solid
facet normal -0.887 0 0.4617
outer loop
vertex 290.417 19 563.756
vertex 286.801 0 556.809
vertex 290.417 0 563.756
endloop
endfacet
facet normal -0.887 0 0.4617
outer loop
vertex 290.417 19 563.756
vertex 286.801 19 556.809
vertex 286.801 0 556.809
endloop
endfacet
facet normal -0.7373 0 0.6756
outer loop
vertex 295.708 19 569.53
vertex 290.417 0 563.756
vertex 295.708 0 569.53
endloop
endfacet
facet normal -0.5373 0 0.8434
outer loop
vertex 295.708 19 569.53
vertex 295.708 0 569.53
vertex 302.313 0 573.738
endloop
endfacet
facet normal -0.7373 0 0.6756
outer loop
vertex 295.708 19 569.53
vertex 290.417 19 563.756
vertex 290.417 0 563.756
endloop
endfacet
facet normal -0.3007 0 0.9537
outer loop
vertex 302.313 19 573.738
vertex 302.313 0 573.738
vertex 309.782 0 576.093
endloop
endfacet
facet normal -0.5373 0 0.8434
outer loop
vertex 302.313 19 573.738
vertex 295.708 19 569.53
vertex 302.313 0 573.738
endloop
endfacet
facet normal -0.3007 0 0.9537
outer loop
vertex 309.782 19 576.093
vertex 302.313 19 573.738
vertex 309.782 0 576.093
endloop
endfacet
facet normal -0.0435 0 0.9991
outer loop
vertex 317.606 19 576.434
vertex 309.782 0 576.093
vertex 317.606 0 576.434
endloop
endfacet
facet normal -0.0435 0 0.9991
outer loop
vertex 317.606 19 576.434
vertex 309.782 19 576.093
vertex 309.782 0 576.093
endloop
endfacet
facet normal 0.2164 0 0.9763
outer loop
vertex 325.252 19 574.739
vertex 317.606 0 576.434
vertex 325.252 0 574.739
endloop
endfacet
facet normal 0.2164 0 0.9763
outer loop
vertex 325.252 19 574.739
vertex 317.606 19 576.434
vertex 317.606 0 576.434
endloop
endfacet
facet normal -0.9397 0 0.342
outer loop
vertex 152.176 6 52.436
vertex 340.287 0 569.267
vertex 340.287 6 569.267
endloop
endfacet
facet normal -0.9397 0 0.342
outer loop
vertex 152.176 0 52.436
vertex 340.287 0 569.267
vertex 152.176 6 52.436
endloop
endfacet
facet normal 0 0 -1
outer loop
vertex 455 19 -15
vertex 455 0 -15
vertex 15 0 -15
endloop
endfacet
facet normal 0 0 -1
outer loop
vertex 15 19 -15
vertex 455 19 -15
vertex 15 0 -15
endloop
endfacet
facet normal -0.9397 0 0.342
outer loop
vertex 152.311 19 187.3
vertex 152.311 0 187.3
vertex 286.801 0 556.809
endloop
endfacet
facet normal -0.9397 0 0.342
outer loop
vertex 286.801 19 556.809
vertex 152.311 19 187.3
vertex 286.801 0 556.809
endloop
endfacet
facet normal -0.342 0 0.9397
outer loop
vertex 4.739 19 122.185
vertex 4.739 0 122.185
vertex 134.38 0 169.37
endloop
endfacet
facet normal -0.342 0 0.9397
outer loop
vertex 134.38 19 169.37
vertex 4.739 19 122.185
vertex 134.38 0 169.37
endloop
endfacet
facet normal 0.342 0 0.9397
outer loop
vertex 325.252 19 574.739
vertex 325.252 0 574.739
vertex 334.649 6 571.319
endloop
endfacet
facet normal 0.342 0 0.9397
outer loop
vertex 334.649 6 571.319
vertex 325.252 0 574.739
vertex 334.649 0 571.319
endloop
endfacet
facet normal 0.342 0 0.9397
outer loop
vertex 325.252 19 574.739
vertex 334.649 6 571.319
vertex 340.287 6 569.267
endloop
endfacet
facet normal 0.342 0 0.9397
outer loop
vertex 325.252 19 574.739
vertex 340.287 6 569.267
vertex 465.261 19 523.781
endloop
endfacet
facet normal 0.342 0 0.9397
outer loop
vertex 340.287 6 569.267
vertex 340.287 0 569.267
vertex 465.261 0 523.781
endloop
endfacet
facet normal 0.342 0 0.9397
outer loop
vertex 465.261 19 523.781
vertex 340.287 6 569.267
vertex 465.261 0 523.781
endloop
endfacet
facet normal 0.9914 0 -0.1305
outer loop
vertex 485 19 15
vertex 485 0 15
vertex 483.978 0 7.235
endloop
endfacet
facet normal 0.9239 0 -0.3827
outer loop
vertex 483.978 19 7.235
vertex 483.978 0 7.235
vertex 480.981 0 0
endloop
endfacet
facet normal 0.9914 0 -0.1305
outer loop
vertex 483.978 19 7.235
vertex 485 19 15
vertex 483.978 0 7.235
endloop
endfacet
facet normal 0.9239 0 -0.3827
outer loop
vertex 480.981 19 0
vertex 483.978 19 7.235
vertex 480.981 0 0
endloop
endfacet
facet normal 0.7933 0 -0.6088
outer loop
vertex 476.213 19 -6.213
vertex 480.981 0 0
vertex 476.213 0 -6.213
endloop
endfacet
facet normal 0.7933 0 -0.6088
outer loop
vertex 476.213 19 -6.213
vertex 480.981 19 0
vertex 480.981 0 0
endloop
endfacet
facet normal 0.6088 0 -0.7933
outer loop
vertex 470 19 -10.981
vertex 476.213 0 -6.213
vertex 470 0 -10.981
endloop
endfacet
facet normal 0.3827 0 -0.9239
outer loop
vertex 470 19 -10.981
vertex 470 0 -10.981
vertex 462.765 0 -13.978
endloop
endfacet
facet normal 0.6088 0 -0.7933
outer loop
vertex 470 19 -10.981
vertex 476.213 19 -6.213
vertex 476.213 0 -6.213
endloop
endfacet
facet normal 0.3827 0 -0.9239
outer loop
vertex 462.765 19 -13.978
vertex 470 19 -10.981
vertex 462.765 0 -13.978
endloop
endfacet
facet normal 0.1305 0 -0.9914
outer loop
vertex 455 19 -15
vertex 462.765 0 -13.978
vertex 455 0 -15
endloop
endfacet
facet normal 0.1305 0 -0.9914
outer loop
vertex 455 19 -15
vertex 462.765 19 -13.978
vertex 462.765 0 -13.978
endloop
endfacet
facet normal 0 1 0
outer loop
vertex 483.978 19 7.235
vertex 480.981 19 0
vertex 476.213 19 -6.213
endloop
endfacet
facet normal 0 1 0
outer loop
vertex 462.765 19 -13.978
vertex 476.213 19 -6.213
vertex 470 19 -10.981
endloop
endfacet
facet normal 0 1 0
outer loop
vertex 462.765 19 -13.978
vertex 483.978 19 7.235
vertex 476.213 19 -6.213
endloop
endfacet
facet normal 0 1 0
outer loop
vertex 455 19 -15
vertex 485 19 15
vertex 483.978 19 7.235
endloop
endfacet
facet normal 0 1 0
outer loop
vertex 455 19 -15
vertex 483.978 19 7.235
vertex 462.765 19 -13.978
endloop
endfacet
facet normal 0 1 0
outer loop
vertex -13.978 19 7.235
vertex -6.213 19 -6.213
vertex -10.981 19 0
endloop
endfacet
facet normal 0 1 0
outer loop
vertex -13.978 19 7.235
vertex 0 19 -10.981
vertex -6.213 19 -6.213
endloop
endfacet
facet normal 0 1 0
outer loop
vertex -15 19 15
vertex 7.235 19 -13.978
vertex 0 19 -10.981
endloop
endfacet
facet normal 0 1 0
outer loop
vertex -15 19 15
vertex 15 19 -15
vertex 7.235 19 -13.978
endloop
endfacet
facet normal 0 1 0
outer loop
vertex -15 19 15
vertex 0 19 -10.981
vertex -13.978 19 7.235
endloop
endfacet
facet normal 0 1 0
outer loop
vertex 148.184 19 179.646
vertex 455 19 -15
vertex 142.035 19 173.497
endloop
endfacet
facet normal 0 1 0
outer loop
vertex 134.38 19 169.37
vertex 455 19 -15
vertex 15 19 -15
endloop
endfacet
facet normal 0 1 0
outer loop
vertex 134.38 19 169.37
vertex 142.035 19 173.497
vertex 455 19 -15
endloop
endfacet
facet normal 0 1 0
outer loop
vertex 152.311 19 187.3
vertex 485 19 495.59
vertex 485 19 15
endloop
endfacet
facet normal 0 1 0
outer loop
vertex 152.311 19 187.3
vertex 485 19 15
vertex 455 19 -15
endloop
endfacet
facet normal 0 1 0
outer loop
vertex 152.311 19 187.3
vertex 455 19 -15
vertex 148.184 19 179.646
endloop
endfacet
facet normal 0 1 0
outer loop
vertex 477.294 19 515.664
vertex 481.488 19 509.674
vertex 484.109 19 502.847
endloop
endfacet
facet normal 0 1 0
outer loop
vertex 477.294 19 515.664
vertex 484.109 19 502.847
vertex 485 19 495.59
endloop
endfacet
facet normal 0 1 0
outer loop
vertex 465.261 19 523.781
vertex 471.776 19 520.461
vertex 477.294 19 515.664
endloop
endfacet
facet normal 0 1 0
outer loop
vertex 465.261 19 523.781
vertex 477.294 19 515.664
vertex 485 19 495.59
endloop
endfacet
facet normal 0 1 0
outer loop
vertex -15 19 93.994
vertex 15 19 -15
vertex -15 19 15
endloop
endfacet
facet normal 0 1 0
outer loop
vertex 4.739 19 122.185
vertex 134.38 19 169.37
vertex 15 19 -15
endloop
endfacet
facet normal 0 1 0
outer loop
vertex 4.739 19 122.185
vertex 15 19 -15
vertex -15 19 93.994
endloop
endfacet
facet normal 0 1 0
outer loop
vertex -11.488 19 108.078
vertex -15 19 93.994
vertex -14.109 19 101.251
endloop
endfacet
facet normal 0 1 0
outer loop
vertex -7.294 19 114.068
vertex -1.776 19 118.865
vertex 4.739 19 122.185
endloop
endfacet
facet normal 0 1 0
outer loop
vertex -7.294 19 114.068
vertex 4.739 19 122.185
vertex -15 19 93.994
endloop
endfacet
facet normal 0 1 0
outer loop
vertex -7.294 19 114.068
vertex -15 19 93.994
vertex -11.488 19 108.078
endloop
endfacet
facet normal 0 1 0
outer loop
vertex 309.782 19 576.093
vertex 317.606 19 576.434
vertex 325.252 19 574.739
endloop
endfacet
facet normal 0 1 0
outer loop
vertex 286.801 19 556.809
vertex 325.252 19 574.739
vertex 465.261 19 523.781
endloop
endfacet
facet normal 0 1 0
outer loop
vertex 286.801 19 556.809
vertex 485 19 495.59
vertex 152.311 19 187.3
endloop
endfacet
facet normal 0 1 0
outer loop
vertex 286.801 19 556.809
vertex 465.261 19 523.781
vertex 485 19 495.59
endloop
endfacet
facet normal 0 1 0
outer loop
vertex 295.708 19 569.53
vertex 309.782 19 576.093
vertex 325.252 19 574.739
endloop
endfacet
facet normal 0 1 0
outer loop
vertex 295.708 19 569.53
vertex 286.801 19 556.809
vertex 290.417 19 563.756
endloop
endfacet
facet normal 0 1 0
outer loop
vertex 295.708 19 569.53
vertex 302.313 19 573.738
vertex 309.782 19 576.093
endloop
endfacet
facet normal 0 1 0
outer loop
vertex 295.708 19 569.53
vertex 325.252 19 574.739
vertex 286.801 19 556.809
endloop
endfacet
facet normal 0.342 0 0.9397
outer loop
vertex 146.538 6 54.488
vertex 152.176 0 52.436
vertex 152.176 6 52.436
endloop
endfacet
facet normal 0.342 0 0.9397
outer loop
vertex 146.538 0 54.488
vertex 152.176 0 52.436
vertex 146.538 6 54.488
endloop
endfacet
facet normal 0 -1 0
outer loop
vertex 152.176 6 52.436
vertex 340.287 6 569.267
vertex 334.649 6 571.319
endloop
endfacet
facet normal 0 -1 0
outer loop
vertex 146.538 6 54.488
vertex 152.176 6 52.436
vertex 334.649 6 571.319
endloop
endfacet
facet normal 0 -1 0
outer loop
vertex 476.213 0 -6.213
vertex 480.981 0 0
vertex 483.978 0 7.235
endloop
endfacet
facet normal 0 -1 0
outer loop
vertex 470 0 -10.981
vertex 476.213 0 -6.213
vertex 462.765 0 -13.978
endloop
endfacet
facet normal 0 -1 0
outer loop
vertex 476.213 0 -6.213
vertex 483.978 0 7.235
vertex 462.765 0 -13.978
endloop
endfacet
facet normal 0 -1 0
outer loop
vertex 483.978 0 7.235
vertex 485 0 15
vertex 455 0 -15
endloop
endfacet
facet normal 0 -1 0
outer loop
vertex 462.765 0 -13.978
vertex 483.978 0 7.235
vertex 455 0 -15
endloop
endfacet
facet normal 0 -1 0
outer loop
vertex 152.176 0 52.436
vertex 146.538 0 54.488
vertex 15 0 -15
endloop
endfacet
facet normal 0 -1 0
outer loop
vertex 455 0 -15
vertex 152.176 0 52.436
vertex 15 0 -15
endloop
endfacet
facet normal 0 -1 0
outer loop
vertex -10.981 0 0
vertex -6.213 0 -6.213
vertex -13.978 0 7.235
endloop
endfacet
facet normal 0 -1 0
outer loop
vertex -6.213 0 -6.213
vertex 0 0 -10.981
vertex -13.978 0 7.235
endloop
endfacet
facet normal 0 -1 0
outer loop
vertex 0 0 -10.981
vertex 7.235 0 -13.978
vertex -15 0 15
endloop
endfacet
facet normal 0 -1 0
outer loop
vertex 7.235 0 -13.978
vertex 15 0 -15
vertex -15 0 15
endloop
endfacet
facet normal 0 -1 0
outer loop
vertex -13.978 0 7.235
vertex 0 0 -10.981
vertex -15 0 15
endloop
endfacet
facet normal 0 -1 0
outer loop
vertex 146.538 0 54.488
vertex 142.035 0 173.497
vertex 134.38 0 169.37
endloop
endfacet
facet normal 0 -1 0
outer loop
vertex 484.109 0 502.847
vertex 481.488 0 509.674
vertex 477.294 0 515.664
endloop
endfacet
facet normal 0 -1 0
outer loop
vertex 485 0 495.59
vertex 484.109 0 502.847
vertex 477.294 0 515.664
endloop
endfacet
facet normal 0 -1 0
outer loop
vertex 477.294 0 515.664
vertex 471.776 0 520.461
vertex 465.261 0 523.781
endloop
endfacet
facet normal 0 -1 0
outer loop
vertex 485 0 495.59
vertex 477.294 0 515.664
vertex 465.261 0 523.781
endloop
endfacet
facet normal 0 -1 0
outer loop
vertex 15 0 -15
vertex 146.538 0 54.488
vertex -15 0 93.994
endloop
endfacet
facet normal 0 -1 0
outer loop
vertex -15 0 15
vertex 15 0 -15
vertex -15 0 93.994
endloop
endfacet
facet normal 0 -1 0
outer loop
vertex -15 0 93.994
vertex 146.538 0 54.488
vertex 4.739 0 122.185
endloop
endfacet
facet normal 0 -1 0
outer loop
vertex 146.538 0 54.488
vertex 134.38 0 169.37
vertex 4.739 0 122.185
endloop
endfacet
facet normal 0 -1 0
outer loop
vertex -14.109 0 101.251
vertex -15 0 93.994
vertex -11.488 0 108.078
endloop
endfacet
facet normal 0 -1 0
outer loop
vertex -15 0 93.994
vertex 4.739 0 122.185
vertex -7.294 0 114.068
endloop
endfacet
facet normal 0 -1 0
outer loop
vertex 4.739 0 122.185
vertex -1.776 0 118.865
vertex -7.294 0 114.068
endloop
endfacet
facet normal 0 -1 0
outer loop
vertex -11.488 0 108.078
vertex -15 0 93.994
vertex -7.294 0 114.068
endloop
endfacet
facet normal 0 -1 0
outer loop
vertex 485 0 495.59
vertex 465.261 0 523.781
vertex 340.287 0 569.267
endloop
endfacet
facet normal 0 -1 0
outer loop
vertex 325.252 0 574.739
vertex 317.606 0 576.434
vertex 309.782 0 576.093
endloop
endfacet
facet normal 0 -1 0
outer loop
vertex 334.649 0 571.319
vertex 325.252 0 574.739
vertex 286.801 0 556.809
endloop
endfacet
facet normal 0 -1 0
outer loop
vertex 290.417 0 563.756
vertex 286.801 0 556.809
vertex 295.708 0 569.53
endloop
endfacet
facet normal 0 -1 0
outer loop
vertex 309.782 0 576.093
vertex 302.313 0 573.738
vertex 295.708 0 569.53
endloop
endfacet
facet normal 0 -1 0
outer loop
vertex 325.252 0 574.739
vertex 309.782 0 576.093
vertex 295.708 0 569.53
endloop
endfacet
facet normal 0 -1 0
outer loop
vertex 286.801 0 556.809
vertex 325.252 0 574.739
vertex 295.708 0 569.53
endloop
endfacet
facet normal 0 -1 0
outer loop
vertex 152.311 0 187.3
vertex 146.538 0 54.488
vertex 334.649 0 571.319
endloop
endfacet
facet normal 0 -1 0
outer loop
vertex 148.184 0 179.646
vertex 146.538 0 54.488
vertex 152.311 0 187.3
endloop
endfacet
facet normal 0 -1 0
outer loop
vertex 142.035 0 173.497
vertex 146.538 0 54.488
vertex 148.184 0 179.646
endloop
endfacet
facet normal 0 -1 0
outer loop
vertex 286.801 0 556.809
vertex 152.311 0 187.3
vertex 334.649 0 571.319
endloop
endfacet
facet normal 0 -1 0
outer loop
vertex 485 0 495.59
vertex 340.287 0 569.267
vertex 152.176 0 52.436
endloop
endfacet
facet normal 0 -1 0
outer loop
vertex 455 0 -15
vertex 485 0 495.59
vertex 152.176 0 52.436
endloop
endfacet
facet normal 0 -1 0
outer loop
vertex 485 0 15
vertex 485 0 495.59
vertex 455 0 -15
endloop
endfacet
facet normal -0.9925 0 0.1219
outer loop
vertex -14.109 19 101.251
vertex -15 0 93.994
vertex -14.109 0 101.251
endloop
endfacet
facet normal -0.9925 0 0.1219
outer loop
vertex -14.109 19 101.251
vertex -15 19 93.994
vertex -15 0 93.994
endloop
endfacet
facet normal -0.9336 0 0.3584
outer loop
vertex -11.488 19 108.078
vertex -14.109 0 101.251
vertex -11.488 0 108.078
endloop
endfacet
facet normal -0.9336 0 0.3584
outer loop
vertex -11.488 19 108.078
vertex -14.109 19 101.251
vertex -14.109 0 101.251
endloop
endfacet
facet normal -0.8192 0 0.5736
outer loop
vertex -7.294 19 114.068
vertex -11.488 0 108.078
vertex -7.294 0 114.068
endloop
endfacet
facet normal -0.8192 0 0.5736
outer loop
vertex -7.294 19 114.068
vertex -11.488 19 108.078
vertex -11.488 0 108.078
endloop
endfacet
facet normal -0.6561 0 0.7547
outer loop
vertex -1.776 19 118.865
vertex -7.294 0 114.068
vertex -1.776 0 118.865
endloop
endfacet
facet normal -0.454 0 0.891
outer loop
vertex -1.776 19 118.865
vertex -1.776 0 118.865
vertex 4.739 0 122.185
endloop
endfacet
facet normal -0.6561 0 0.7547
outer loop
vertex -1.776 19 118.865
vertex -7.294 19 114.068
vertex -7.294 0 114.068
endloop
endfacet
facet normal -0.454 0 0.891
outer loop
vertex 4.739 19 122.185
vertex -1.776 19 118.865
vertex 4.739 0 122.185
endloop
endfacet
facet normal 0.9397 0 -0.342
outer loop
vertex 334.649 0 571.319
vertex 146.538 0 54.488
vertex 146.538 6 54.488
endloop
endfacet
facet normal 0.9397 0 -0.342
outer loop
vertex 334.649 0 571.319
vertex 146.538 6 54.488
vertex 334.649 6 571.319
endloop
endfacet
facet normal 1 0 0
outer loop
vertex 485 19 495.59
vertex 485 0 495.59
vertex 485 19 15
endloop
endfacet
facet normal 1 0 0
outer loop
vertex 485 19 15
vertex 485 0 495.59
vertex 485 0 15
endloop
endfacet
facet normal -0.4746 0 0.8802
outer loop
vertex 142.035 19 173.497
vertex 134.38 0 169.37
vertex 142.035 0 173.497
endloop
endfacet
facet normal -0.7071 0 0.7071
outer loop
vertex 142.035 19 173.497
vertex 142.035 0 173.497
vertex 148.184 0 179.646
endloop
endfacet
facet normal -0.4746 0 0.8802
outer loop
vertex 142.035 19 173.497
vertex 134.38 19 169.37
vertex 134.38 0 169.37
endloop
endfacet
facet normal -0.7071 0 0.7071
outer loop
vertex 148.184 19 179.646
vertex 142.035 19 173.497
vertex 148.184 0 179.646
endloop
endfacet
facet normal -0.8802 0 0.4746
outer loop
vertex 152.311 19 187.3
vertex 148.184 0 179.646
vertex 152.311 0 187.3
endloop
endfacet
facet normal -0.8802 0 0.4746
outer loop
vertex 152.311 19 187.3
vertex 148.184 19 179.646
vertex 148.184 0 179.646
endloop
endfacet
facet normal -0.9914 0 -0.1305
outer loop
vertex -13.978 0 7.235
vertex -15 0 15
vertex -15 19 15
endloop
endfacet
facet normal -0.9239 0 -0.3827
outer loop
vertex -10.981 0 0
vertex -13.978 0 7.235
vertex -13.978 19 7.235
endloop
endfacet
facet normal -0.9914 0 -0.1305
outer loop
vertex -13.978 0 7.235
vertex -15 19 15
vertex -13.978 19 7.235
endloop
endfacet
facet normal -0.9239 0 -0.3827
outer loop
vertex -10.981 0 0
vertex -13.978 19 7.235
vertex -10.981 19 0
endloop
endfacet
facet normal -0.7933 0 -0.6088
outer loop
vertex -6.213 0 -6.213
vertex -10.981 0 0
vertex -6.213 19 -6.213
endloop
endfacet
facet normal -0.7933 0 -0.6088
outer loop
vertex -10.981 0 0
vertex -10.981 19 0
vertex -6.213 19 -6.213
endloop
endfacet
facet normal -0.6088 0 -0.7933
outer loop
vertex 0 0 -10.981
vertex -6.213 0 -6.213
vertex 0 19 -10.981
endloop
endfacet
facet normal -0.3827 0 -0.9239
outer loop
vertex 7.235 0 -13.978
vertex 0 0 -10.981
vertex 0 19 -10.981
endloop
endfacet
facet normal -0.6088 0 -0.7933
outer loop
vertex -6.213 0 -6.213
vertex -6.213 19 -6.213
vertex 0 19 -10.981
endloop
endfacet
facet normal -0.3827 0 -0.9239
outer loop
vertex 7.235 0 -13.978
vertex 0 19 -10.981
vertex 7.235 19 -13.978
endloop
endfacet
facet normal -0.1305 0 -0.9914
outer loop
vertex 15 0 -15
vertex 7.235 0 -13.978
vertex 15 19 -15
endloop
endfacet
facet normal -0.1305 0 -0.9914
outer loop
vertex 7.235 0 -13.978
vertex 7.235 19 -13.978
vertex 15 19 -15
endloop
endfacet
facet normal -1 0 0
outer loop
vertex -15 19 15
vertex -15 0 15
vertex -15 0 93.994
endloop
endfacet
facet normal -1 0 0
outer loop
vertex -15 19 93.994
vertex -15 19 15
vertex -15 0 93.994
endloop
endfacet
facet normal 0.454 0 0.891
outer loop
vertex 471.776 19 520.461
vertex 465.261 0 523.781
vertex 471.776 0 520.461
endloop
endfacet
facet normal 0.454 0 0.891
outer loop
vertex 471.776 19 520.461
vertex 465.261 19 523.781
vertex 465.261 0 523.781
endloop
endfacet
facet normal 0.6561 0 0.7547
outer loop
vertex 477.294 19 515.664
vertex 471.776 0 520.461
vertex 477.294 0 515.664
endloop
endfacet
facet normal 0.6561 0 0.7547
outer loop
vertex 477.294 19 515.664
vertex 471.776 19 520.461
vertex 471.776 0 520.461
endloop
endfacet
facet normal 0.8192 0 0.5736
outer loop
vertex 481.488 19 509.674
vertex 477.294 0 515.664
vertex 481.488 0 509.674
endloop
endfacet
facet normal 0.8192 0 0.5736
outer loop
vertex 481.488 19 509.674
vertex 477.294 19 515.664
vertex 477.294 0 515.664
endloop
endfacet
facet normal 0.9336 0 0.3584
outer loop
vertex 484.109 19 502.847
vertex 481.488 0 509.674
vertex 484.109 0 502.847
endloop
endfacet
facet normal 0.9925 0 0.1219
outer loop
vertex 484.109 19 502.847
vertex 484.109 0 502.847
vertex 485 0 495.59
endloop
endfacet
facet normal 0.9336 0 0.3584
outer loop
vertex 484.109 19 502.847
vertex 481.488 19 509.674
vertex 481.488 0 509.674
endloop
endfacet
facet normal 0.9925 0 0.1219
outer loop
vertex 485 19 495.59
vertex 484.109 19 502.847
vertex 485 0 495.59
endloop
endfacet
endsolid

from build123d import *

# Parameters (mm, degrees)
PAD_DEPTH    = 19
FILLET_R     = 30
FILLET001_R  = 30
POCKET_DEPTH = 6


with BuildPart() as part:
    # Sketch001 → Pad (new body)
    with BuildSketch(Plane.XZ):
        Polygon((-15, -15), (-15, 115), (147.5259872373, 174.1546216491), (297.0614758428, 585), (485, 516.5959713349), (485, -15), align=None)
    extrude(amount=-PAD_DEPTH)

    # Fillet
    fillet_edges = [part.edges().sort_by_distance(p)[0] for p in [
        (-15, 9.5, 115),
        (-15, 9.5, -15),
        (297.061476, 9.5, 585),
        (485, 9.5, 516.595971),
        (485, 9.5, -15),
    ]]
    fillet(fillet_edges, radius=FILLET_R)

    # Fillet001
    fillet001_edges = [part.edges().sort_by_distance(p)[0] for p in [
        (147.525987, 9.5, 174.154622),
    ]]
    fillet(fillet001_edges, radius=FILLET001_R)

    # Sketch002 (on Face1 of Fillet001) → Pocket (cut)
    with BuildSketch(Plane.XZ):
        Polygon((340.287336399, 569.267073407), (152.1762575699, 52.4361319748), (146.5381018451, 54.4882528347), (334.6491806743, 571.319194267), align=None)
    extrude(amount=-POCKET_DEPTH, mode=Mode.SUBTRACT)


solid = part.part
